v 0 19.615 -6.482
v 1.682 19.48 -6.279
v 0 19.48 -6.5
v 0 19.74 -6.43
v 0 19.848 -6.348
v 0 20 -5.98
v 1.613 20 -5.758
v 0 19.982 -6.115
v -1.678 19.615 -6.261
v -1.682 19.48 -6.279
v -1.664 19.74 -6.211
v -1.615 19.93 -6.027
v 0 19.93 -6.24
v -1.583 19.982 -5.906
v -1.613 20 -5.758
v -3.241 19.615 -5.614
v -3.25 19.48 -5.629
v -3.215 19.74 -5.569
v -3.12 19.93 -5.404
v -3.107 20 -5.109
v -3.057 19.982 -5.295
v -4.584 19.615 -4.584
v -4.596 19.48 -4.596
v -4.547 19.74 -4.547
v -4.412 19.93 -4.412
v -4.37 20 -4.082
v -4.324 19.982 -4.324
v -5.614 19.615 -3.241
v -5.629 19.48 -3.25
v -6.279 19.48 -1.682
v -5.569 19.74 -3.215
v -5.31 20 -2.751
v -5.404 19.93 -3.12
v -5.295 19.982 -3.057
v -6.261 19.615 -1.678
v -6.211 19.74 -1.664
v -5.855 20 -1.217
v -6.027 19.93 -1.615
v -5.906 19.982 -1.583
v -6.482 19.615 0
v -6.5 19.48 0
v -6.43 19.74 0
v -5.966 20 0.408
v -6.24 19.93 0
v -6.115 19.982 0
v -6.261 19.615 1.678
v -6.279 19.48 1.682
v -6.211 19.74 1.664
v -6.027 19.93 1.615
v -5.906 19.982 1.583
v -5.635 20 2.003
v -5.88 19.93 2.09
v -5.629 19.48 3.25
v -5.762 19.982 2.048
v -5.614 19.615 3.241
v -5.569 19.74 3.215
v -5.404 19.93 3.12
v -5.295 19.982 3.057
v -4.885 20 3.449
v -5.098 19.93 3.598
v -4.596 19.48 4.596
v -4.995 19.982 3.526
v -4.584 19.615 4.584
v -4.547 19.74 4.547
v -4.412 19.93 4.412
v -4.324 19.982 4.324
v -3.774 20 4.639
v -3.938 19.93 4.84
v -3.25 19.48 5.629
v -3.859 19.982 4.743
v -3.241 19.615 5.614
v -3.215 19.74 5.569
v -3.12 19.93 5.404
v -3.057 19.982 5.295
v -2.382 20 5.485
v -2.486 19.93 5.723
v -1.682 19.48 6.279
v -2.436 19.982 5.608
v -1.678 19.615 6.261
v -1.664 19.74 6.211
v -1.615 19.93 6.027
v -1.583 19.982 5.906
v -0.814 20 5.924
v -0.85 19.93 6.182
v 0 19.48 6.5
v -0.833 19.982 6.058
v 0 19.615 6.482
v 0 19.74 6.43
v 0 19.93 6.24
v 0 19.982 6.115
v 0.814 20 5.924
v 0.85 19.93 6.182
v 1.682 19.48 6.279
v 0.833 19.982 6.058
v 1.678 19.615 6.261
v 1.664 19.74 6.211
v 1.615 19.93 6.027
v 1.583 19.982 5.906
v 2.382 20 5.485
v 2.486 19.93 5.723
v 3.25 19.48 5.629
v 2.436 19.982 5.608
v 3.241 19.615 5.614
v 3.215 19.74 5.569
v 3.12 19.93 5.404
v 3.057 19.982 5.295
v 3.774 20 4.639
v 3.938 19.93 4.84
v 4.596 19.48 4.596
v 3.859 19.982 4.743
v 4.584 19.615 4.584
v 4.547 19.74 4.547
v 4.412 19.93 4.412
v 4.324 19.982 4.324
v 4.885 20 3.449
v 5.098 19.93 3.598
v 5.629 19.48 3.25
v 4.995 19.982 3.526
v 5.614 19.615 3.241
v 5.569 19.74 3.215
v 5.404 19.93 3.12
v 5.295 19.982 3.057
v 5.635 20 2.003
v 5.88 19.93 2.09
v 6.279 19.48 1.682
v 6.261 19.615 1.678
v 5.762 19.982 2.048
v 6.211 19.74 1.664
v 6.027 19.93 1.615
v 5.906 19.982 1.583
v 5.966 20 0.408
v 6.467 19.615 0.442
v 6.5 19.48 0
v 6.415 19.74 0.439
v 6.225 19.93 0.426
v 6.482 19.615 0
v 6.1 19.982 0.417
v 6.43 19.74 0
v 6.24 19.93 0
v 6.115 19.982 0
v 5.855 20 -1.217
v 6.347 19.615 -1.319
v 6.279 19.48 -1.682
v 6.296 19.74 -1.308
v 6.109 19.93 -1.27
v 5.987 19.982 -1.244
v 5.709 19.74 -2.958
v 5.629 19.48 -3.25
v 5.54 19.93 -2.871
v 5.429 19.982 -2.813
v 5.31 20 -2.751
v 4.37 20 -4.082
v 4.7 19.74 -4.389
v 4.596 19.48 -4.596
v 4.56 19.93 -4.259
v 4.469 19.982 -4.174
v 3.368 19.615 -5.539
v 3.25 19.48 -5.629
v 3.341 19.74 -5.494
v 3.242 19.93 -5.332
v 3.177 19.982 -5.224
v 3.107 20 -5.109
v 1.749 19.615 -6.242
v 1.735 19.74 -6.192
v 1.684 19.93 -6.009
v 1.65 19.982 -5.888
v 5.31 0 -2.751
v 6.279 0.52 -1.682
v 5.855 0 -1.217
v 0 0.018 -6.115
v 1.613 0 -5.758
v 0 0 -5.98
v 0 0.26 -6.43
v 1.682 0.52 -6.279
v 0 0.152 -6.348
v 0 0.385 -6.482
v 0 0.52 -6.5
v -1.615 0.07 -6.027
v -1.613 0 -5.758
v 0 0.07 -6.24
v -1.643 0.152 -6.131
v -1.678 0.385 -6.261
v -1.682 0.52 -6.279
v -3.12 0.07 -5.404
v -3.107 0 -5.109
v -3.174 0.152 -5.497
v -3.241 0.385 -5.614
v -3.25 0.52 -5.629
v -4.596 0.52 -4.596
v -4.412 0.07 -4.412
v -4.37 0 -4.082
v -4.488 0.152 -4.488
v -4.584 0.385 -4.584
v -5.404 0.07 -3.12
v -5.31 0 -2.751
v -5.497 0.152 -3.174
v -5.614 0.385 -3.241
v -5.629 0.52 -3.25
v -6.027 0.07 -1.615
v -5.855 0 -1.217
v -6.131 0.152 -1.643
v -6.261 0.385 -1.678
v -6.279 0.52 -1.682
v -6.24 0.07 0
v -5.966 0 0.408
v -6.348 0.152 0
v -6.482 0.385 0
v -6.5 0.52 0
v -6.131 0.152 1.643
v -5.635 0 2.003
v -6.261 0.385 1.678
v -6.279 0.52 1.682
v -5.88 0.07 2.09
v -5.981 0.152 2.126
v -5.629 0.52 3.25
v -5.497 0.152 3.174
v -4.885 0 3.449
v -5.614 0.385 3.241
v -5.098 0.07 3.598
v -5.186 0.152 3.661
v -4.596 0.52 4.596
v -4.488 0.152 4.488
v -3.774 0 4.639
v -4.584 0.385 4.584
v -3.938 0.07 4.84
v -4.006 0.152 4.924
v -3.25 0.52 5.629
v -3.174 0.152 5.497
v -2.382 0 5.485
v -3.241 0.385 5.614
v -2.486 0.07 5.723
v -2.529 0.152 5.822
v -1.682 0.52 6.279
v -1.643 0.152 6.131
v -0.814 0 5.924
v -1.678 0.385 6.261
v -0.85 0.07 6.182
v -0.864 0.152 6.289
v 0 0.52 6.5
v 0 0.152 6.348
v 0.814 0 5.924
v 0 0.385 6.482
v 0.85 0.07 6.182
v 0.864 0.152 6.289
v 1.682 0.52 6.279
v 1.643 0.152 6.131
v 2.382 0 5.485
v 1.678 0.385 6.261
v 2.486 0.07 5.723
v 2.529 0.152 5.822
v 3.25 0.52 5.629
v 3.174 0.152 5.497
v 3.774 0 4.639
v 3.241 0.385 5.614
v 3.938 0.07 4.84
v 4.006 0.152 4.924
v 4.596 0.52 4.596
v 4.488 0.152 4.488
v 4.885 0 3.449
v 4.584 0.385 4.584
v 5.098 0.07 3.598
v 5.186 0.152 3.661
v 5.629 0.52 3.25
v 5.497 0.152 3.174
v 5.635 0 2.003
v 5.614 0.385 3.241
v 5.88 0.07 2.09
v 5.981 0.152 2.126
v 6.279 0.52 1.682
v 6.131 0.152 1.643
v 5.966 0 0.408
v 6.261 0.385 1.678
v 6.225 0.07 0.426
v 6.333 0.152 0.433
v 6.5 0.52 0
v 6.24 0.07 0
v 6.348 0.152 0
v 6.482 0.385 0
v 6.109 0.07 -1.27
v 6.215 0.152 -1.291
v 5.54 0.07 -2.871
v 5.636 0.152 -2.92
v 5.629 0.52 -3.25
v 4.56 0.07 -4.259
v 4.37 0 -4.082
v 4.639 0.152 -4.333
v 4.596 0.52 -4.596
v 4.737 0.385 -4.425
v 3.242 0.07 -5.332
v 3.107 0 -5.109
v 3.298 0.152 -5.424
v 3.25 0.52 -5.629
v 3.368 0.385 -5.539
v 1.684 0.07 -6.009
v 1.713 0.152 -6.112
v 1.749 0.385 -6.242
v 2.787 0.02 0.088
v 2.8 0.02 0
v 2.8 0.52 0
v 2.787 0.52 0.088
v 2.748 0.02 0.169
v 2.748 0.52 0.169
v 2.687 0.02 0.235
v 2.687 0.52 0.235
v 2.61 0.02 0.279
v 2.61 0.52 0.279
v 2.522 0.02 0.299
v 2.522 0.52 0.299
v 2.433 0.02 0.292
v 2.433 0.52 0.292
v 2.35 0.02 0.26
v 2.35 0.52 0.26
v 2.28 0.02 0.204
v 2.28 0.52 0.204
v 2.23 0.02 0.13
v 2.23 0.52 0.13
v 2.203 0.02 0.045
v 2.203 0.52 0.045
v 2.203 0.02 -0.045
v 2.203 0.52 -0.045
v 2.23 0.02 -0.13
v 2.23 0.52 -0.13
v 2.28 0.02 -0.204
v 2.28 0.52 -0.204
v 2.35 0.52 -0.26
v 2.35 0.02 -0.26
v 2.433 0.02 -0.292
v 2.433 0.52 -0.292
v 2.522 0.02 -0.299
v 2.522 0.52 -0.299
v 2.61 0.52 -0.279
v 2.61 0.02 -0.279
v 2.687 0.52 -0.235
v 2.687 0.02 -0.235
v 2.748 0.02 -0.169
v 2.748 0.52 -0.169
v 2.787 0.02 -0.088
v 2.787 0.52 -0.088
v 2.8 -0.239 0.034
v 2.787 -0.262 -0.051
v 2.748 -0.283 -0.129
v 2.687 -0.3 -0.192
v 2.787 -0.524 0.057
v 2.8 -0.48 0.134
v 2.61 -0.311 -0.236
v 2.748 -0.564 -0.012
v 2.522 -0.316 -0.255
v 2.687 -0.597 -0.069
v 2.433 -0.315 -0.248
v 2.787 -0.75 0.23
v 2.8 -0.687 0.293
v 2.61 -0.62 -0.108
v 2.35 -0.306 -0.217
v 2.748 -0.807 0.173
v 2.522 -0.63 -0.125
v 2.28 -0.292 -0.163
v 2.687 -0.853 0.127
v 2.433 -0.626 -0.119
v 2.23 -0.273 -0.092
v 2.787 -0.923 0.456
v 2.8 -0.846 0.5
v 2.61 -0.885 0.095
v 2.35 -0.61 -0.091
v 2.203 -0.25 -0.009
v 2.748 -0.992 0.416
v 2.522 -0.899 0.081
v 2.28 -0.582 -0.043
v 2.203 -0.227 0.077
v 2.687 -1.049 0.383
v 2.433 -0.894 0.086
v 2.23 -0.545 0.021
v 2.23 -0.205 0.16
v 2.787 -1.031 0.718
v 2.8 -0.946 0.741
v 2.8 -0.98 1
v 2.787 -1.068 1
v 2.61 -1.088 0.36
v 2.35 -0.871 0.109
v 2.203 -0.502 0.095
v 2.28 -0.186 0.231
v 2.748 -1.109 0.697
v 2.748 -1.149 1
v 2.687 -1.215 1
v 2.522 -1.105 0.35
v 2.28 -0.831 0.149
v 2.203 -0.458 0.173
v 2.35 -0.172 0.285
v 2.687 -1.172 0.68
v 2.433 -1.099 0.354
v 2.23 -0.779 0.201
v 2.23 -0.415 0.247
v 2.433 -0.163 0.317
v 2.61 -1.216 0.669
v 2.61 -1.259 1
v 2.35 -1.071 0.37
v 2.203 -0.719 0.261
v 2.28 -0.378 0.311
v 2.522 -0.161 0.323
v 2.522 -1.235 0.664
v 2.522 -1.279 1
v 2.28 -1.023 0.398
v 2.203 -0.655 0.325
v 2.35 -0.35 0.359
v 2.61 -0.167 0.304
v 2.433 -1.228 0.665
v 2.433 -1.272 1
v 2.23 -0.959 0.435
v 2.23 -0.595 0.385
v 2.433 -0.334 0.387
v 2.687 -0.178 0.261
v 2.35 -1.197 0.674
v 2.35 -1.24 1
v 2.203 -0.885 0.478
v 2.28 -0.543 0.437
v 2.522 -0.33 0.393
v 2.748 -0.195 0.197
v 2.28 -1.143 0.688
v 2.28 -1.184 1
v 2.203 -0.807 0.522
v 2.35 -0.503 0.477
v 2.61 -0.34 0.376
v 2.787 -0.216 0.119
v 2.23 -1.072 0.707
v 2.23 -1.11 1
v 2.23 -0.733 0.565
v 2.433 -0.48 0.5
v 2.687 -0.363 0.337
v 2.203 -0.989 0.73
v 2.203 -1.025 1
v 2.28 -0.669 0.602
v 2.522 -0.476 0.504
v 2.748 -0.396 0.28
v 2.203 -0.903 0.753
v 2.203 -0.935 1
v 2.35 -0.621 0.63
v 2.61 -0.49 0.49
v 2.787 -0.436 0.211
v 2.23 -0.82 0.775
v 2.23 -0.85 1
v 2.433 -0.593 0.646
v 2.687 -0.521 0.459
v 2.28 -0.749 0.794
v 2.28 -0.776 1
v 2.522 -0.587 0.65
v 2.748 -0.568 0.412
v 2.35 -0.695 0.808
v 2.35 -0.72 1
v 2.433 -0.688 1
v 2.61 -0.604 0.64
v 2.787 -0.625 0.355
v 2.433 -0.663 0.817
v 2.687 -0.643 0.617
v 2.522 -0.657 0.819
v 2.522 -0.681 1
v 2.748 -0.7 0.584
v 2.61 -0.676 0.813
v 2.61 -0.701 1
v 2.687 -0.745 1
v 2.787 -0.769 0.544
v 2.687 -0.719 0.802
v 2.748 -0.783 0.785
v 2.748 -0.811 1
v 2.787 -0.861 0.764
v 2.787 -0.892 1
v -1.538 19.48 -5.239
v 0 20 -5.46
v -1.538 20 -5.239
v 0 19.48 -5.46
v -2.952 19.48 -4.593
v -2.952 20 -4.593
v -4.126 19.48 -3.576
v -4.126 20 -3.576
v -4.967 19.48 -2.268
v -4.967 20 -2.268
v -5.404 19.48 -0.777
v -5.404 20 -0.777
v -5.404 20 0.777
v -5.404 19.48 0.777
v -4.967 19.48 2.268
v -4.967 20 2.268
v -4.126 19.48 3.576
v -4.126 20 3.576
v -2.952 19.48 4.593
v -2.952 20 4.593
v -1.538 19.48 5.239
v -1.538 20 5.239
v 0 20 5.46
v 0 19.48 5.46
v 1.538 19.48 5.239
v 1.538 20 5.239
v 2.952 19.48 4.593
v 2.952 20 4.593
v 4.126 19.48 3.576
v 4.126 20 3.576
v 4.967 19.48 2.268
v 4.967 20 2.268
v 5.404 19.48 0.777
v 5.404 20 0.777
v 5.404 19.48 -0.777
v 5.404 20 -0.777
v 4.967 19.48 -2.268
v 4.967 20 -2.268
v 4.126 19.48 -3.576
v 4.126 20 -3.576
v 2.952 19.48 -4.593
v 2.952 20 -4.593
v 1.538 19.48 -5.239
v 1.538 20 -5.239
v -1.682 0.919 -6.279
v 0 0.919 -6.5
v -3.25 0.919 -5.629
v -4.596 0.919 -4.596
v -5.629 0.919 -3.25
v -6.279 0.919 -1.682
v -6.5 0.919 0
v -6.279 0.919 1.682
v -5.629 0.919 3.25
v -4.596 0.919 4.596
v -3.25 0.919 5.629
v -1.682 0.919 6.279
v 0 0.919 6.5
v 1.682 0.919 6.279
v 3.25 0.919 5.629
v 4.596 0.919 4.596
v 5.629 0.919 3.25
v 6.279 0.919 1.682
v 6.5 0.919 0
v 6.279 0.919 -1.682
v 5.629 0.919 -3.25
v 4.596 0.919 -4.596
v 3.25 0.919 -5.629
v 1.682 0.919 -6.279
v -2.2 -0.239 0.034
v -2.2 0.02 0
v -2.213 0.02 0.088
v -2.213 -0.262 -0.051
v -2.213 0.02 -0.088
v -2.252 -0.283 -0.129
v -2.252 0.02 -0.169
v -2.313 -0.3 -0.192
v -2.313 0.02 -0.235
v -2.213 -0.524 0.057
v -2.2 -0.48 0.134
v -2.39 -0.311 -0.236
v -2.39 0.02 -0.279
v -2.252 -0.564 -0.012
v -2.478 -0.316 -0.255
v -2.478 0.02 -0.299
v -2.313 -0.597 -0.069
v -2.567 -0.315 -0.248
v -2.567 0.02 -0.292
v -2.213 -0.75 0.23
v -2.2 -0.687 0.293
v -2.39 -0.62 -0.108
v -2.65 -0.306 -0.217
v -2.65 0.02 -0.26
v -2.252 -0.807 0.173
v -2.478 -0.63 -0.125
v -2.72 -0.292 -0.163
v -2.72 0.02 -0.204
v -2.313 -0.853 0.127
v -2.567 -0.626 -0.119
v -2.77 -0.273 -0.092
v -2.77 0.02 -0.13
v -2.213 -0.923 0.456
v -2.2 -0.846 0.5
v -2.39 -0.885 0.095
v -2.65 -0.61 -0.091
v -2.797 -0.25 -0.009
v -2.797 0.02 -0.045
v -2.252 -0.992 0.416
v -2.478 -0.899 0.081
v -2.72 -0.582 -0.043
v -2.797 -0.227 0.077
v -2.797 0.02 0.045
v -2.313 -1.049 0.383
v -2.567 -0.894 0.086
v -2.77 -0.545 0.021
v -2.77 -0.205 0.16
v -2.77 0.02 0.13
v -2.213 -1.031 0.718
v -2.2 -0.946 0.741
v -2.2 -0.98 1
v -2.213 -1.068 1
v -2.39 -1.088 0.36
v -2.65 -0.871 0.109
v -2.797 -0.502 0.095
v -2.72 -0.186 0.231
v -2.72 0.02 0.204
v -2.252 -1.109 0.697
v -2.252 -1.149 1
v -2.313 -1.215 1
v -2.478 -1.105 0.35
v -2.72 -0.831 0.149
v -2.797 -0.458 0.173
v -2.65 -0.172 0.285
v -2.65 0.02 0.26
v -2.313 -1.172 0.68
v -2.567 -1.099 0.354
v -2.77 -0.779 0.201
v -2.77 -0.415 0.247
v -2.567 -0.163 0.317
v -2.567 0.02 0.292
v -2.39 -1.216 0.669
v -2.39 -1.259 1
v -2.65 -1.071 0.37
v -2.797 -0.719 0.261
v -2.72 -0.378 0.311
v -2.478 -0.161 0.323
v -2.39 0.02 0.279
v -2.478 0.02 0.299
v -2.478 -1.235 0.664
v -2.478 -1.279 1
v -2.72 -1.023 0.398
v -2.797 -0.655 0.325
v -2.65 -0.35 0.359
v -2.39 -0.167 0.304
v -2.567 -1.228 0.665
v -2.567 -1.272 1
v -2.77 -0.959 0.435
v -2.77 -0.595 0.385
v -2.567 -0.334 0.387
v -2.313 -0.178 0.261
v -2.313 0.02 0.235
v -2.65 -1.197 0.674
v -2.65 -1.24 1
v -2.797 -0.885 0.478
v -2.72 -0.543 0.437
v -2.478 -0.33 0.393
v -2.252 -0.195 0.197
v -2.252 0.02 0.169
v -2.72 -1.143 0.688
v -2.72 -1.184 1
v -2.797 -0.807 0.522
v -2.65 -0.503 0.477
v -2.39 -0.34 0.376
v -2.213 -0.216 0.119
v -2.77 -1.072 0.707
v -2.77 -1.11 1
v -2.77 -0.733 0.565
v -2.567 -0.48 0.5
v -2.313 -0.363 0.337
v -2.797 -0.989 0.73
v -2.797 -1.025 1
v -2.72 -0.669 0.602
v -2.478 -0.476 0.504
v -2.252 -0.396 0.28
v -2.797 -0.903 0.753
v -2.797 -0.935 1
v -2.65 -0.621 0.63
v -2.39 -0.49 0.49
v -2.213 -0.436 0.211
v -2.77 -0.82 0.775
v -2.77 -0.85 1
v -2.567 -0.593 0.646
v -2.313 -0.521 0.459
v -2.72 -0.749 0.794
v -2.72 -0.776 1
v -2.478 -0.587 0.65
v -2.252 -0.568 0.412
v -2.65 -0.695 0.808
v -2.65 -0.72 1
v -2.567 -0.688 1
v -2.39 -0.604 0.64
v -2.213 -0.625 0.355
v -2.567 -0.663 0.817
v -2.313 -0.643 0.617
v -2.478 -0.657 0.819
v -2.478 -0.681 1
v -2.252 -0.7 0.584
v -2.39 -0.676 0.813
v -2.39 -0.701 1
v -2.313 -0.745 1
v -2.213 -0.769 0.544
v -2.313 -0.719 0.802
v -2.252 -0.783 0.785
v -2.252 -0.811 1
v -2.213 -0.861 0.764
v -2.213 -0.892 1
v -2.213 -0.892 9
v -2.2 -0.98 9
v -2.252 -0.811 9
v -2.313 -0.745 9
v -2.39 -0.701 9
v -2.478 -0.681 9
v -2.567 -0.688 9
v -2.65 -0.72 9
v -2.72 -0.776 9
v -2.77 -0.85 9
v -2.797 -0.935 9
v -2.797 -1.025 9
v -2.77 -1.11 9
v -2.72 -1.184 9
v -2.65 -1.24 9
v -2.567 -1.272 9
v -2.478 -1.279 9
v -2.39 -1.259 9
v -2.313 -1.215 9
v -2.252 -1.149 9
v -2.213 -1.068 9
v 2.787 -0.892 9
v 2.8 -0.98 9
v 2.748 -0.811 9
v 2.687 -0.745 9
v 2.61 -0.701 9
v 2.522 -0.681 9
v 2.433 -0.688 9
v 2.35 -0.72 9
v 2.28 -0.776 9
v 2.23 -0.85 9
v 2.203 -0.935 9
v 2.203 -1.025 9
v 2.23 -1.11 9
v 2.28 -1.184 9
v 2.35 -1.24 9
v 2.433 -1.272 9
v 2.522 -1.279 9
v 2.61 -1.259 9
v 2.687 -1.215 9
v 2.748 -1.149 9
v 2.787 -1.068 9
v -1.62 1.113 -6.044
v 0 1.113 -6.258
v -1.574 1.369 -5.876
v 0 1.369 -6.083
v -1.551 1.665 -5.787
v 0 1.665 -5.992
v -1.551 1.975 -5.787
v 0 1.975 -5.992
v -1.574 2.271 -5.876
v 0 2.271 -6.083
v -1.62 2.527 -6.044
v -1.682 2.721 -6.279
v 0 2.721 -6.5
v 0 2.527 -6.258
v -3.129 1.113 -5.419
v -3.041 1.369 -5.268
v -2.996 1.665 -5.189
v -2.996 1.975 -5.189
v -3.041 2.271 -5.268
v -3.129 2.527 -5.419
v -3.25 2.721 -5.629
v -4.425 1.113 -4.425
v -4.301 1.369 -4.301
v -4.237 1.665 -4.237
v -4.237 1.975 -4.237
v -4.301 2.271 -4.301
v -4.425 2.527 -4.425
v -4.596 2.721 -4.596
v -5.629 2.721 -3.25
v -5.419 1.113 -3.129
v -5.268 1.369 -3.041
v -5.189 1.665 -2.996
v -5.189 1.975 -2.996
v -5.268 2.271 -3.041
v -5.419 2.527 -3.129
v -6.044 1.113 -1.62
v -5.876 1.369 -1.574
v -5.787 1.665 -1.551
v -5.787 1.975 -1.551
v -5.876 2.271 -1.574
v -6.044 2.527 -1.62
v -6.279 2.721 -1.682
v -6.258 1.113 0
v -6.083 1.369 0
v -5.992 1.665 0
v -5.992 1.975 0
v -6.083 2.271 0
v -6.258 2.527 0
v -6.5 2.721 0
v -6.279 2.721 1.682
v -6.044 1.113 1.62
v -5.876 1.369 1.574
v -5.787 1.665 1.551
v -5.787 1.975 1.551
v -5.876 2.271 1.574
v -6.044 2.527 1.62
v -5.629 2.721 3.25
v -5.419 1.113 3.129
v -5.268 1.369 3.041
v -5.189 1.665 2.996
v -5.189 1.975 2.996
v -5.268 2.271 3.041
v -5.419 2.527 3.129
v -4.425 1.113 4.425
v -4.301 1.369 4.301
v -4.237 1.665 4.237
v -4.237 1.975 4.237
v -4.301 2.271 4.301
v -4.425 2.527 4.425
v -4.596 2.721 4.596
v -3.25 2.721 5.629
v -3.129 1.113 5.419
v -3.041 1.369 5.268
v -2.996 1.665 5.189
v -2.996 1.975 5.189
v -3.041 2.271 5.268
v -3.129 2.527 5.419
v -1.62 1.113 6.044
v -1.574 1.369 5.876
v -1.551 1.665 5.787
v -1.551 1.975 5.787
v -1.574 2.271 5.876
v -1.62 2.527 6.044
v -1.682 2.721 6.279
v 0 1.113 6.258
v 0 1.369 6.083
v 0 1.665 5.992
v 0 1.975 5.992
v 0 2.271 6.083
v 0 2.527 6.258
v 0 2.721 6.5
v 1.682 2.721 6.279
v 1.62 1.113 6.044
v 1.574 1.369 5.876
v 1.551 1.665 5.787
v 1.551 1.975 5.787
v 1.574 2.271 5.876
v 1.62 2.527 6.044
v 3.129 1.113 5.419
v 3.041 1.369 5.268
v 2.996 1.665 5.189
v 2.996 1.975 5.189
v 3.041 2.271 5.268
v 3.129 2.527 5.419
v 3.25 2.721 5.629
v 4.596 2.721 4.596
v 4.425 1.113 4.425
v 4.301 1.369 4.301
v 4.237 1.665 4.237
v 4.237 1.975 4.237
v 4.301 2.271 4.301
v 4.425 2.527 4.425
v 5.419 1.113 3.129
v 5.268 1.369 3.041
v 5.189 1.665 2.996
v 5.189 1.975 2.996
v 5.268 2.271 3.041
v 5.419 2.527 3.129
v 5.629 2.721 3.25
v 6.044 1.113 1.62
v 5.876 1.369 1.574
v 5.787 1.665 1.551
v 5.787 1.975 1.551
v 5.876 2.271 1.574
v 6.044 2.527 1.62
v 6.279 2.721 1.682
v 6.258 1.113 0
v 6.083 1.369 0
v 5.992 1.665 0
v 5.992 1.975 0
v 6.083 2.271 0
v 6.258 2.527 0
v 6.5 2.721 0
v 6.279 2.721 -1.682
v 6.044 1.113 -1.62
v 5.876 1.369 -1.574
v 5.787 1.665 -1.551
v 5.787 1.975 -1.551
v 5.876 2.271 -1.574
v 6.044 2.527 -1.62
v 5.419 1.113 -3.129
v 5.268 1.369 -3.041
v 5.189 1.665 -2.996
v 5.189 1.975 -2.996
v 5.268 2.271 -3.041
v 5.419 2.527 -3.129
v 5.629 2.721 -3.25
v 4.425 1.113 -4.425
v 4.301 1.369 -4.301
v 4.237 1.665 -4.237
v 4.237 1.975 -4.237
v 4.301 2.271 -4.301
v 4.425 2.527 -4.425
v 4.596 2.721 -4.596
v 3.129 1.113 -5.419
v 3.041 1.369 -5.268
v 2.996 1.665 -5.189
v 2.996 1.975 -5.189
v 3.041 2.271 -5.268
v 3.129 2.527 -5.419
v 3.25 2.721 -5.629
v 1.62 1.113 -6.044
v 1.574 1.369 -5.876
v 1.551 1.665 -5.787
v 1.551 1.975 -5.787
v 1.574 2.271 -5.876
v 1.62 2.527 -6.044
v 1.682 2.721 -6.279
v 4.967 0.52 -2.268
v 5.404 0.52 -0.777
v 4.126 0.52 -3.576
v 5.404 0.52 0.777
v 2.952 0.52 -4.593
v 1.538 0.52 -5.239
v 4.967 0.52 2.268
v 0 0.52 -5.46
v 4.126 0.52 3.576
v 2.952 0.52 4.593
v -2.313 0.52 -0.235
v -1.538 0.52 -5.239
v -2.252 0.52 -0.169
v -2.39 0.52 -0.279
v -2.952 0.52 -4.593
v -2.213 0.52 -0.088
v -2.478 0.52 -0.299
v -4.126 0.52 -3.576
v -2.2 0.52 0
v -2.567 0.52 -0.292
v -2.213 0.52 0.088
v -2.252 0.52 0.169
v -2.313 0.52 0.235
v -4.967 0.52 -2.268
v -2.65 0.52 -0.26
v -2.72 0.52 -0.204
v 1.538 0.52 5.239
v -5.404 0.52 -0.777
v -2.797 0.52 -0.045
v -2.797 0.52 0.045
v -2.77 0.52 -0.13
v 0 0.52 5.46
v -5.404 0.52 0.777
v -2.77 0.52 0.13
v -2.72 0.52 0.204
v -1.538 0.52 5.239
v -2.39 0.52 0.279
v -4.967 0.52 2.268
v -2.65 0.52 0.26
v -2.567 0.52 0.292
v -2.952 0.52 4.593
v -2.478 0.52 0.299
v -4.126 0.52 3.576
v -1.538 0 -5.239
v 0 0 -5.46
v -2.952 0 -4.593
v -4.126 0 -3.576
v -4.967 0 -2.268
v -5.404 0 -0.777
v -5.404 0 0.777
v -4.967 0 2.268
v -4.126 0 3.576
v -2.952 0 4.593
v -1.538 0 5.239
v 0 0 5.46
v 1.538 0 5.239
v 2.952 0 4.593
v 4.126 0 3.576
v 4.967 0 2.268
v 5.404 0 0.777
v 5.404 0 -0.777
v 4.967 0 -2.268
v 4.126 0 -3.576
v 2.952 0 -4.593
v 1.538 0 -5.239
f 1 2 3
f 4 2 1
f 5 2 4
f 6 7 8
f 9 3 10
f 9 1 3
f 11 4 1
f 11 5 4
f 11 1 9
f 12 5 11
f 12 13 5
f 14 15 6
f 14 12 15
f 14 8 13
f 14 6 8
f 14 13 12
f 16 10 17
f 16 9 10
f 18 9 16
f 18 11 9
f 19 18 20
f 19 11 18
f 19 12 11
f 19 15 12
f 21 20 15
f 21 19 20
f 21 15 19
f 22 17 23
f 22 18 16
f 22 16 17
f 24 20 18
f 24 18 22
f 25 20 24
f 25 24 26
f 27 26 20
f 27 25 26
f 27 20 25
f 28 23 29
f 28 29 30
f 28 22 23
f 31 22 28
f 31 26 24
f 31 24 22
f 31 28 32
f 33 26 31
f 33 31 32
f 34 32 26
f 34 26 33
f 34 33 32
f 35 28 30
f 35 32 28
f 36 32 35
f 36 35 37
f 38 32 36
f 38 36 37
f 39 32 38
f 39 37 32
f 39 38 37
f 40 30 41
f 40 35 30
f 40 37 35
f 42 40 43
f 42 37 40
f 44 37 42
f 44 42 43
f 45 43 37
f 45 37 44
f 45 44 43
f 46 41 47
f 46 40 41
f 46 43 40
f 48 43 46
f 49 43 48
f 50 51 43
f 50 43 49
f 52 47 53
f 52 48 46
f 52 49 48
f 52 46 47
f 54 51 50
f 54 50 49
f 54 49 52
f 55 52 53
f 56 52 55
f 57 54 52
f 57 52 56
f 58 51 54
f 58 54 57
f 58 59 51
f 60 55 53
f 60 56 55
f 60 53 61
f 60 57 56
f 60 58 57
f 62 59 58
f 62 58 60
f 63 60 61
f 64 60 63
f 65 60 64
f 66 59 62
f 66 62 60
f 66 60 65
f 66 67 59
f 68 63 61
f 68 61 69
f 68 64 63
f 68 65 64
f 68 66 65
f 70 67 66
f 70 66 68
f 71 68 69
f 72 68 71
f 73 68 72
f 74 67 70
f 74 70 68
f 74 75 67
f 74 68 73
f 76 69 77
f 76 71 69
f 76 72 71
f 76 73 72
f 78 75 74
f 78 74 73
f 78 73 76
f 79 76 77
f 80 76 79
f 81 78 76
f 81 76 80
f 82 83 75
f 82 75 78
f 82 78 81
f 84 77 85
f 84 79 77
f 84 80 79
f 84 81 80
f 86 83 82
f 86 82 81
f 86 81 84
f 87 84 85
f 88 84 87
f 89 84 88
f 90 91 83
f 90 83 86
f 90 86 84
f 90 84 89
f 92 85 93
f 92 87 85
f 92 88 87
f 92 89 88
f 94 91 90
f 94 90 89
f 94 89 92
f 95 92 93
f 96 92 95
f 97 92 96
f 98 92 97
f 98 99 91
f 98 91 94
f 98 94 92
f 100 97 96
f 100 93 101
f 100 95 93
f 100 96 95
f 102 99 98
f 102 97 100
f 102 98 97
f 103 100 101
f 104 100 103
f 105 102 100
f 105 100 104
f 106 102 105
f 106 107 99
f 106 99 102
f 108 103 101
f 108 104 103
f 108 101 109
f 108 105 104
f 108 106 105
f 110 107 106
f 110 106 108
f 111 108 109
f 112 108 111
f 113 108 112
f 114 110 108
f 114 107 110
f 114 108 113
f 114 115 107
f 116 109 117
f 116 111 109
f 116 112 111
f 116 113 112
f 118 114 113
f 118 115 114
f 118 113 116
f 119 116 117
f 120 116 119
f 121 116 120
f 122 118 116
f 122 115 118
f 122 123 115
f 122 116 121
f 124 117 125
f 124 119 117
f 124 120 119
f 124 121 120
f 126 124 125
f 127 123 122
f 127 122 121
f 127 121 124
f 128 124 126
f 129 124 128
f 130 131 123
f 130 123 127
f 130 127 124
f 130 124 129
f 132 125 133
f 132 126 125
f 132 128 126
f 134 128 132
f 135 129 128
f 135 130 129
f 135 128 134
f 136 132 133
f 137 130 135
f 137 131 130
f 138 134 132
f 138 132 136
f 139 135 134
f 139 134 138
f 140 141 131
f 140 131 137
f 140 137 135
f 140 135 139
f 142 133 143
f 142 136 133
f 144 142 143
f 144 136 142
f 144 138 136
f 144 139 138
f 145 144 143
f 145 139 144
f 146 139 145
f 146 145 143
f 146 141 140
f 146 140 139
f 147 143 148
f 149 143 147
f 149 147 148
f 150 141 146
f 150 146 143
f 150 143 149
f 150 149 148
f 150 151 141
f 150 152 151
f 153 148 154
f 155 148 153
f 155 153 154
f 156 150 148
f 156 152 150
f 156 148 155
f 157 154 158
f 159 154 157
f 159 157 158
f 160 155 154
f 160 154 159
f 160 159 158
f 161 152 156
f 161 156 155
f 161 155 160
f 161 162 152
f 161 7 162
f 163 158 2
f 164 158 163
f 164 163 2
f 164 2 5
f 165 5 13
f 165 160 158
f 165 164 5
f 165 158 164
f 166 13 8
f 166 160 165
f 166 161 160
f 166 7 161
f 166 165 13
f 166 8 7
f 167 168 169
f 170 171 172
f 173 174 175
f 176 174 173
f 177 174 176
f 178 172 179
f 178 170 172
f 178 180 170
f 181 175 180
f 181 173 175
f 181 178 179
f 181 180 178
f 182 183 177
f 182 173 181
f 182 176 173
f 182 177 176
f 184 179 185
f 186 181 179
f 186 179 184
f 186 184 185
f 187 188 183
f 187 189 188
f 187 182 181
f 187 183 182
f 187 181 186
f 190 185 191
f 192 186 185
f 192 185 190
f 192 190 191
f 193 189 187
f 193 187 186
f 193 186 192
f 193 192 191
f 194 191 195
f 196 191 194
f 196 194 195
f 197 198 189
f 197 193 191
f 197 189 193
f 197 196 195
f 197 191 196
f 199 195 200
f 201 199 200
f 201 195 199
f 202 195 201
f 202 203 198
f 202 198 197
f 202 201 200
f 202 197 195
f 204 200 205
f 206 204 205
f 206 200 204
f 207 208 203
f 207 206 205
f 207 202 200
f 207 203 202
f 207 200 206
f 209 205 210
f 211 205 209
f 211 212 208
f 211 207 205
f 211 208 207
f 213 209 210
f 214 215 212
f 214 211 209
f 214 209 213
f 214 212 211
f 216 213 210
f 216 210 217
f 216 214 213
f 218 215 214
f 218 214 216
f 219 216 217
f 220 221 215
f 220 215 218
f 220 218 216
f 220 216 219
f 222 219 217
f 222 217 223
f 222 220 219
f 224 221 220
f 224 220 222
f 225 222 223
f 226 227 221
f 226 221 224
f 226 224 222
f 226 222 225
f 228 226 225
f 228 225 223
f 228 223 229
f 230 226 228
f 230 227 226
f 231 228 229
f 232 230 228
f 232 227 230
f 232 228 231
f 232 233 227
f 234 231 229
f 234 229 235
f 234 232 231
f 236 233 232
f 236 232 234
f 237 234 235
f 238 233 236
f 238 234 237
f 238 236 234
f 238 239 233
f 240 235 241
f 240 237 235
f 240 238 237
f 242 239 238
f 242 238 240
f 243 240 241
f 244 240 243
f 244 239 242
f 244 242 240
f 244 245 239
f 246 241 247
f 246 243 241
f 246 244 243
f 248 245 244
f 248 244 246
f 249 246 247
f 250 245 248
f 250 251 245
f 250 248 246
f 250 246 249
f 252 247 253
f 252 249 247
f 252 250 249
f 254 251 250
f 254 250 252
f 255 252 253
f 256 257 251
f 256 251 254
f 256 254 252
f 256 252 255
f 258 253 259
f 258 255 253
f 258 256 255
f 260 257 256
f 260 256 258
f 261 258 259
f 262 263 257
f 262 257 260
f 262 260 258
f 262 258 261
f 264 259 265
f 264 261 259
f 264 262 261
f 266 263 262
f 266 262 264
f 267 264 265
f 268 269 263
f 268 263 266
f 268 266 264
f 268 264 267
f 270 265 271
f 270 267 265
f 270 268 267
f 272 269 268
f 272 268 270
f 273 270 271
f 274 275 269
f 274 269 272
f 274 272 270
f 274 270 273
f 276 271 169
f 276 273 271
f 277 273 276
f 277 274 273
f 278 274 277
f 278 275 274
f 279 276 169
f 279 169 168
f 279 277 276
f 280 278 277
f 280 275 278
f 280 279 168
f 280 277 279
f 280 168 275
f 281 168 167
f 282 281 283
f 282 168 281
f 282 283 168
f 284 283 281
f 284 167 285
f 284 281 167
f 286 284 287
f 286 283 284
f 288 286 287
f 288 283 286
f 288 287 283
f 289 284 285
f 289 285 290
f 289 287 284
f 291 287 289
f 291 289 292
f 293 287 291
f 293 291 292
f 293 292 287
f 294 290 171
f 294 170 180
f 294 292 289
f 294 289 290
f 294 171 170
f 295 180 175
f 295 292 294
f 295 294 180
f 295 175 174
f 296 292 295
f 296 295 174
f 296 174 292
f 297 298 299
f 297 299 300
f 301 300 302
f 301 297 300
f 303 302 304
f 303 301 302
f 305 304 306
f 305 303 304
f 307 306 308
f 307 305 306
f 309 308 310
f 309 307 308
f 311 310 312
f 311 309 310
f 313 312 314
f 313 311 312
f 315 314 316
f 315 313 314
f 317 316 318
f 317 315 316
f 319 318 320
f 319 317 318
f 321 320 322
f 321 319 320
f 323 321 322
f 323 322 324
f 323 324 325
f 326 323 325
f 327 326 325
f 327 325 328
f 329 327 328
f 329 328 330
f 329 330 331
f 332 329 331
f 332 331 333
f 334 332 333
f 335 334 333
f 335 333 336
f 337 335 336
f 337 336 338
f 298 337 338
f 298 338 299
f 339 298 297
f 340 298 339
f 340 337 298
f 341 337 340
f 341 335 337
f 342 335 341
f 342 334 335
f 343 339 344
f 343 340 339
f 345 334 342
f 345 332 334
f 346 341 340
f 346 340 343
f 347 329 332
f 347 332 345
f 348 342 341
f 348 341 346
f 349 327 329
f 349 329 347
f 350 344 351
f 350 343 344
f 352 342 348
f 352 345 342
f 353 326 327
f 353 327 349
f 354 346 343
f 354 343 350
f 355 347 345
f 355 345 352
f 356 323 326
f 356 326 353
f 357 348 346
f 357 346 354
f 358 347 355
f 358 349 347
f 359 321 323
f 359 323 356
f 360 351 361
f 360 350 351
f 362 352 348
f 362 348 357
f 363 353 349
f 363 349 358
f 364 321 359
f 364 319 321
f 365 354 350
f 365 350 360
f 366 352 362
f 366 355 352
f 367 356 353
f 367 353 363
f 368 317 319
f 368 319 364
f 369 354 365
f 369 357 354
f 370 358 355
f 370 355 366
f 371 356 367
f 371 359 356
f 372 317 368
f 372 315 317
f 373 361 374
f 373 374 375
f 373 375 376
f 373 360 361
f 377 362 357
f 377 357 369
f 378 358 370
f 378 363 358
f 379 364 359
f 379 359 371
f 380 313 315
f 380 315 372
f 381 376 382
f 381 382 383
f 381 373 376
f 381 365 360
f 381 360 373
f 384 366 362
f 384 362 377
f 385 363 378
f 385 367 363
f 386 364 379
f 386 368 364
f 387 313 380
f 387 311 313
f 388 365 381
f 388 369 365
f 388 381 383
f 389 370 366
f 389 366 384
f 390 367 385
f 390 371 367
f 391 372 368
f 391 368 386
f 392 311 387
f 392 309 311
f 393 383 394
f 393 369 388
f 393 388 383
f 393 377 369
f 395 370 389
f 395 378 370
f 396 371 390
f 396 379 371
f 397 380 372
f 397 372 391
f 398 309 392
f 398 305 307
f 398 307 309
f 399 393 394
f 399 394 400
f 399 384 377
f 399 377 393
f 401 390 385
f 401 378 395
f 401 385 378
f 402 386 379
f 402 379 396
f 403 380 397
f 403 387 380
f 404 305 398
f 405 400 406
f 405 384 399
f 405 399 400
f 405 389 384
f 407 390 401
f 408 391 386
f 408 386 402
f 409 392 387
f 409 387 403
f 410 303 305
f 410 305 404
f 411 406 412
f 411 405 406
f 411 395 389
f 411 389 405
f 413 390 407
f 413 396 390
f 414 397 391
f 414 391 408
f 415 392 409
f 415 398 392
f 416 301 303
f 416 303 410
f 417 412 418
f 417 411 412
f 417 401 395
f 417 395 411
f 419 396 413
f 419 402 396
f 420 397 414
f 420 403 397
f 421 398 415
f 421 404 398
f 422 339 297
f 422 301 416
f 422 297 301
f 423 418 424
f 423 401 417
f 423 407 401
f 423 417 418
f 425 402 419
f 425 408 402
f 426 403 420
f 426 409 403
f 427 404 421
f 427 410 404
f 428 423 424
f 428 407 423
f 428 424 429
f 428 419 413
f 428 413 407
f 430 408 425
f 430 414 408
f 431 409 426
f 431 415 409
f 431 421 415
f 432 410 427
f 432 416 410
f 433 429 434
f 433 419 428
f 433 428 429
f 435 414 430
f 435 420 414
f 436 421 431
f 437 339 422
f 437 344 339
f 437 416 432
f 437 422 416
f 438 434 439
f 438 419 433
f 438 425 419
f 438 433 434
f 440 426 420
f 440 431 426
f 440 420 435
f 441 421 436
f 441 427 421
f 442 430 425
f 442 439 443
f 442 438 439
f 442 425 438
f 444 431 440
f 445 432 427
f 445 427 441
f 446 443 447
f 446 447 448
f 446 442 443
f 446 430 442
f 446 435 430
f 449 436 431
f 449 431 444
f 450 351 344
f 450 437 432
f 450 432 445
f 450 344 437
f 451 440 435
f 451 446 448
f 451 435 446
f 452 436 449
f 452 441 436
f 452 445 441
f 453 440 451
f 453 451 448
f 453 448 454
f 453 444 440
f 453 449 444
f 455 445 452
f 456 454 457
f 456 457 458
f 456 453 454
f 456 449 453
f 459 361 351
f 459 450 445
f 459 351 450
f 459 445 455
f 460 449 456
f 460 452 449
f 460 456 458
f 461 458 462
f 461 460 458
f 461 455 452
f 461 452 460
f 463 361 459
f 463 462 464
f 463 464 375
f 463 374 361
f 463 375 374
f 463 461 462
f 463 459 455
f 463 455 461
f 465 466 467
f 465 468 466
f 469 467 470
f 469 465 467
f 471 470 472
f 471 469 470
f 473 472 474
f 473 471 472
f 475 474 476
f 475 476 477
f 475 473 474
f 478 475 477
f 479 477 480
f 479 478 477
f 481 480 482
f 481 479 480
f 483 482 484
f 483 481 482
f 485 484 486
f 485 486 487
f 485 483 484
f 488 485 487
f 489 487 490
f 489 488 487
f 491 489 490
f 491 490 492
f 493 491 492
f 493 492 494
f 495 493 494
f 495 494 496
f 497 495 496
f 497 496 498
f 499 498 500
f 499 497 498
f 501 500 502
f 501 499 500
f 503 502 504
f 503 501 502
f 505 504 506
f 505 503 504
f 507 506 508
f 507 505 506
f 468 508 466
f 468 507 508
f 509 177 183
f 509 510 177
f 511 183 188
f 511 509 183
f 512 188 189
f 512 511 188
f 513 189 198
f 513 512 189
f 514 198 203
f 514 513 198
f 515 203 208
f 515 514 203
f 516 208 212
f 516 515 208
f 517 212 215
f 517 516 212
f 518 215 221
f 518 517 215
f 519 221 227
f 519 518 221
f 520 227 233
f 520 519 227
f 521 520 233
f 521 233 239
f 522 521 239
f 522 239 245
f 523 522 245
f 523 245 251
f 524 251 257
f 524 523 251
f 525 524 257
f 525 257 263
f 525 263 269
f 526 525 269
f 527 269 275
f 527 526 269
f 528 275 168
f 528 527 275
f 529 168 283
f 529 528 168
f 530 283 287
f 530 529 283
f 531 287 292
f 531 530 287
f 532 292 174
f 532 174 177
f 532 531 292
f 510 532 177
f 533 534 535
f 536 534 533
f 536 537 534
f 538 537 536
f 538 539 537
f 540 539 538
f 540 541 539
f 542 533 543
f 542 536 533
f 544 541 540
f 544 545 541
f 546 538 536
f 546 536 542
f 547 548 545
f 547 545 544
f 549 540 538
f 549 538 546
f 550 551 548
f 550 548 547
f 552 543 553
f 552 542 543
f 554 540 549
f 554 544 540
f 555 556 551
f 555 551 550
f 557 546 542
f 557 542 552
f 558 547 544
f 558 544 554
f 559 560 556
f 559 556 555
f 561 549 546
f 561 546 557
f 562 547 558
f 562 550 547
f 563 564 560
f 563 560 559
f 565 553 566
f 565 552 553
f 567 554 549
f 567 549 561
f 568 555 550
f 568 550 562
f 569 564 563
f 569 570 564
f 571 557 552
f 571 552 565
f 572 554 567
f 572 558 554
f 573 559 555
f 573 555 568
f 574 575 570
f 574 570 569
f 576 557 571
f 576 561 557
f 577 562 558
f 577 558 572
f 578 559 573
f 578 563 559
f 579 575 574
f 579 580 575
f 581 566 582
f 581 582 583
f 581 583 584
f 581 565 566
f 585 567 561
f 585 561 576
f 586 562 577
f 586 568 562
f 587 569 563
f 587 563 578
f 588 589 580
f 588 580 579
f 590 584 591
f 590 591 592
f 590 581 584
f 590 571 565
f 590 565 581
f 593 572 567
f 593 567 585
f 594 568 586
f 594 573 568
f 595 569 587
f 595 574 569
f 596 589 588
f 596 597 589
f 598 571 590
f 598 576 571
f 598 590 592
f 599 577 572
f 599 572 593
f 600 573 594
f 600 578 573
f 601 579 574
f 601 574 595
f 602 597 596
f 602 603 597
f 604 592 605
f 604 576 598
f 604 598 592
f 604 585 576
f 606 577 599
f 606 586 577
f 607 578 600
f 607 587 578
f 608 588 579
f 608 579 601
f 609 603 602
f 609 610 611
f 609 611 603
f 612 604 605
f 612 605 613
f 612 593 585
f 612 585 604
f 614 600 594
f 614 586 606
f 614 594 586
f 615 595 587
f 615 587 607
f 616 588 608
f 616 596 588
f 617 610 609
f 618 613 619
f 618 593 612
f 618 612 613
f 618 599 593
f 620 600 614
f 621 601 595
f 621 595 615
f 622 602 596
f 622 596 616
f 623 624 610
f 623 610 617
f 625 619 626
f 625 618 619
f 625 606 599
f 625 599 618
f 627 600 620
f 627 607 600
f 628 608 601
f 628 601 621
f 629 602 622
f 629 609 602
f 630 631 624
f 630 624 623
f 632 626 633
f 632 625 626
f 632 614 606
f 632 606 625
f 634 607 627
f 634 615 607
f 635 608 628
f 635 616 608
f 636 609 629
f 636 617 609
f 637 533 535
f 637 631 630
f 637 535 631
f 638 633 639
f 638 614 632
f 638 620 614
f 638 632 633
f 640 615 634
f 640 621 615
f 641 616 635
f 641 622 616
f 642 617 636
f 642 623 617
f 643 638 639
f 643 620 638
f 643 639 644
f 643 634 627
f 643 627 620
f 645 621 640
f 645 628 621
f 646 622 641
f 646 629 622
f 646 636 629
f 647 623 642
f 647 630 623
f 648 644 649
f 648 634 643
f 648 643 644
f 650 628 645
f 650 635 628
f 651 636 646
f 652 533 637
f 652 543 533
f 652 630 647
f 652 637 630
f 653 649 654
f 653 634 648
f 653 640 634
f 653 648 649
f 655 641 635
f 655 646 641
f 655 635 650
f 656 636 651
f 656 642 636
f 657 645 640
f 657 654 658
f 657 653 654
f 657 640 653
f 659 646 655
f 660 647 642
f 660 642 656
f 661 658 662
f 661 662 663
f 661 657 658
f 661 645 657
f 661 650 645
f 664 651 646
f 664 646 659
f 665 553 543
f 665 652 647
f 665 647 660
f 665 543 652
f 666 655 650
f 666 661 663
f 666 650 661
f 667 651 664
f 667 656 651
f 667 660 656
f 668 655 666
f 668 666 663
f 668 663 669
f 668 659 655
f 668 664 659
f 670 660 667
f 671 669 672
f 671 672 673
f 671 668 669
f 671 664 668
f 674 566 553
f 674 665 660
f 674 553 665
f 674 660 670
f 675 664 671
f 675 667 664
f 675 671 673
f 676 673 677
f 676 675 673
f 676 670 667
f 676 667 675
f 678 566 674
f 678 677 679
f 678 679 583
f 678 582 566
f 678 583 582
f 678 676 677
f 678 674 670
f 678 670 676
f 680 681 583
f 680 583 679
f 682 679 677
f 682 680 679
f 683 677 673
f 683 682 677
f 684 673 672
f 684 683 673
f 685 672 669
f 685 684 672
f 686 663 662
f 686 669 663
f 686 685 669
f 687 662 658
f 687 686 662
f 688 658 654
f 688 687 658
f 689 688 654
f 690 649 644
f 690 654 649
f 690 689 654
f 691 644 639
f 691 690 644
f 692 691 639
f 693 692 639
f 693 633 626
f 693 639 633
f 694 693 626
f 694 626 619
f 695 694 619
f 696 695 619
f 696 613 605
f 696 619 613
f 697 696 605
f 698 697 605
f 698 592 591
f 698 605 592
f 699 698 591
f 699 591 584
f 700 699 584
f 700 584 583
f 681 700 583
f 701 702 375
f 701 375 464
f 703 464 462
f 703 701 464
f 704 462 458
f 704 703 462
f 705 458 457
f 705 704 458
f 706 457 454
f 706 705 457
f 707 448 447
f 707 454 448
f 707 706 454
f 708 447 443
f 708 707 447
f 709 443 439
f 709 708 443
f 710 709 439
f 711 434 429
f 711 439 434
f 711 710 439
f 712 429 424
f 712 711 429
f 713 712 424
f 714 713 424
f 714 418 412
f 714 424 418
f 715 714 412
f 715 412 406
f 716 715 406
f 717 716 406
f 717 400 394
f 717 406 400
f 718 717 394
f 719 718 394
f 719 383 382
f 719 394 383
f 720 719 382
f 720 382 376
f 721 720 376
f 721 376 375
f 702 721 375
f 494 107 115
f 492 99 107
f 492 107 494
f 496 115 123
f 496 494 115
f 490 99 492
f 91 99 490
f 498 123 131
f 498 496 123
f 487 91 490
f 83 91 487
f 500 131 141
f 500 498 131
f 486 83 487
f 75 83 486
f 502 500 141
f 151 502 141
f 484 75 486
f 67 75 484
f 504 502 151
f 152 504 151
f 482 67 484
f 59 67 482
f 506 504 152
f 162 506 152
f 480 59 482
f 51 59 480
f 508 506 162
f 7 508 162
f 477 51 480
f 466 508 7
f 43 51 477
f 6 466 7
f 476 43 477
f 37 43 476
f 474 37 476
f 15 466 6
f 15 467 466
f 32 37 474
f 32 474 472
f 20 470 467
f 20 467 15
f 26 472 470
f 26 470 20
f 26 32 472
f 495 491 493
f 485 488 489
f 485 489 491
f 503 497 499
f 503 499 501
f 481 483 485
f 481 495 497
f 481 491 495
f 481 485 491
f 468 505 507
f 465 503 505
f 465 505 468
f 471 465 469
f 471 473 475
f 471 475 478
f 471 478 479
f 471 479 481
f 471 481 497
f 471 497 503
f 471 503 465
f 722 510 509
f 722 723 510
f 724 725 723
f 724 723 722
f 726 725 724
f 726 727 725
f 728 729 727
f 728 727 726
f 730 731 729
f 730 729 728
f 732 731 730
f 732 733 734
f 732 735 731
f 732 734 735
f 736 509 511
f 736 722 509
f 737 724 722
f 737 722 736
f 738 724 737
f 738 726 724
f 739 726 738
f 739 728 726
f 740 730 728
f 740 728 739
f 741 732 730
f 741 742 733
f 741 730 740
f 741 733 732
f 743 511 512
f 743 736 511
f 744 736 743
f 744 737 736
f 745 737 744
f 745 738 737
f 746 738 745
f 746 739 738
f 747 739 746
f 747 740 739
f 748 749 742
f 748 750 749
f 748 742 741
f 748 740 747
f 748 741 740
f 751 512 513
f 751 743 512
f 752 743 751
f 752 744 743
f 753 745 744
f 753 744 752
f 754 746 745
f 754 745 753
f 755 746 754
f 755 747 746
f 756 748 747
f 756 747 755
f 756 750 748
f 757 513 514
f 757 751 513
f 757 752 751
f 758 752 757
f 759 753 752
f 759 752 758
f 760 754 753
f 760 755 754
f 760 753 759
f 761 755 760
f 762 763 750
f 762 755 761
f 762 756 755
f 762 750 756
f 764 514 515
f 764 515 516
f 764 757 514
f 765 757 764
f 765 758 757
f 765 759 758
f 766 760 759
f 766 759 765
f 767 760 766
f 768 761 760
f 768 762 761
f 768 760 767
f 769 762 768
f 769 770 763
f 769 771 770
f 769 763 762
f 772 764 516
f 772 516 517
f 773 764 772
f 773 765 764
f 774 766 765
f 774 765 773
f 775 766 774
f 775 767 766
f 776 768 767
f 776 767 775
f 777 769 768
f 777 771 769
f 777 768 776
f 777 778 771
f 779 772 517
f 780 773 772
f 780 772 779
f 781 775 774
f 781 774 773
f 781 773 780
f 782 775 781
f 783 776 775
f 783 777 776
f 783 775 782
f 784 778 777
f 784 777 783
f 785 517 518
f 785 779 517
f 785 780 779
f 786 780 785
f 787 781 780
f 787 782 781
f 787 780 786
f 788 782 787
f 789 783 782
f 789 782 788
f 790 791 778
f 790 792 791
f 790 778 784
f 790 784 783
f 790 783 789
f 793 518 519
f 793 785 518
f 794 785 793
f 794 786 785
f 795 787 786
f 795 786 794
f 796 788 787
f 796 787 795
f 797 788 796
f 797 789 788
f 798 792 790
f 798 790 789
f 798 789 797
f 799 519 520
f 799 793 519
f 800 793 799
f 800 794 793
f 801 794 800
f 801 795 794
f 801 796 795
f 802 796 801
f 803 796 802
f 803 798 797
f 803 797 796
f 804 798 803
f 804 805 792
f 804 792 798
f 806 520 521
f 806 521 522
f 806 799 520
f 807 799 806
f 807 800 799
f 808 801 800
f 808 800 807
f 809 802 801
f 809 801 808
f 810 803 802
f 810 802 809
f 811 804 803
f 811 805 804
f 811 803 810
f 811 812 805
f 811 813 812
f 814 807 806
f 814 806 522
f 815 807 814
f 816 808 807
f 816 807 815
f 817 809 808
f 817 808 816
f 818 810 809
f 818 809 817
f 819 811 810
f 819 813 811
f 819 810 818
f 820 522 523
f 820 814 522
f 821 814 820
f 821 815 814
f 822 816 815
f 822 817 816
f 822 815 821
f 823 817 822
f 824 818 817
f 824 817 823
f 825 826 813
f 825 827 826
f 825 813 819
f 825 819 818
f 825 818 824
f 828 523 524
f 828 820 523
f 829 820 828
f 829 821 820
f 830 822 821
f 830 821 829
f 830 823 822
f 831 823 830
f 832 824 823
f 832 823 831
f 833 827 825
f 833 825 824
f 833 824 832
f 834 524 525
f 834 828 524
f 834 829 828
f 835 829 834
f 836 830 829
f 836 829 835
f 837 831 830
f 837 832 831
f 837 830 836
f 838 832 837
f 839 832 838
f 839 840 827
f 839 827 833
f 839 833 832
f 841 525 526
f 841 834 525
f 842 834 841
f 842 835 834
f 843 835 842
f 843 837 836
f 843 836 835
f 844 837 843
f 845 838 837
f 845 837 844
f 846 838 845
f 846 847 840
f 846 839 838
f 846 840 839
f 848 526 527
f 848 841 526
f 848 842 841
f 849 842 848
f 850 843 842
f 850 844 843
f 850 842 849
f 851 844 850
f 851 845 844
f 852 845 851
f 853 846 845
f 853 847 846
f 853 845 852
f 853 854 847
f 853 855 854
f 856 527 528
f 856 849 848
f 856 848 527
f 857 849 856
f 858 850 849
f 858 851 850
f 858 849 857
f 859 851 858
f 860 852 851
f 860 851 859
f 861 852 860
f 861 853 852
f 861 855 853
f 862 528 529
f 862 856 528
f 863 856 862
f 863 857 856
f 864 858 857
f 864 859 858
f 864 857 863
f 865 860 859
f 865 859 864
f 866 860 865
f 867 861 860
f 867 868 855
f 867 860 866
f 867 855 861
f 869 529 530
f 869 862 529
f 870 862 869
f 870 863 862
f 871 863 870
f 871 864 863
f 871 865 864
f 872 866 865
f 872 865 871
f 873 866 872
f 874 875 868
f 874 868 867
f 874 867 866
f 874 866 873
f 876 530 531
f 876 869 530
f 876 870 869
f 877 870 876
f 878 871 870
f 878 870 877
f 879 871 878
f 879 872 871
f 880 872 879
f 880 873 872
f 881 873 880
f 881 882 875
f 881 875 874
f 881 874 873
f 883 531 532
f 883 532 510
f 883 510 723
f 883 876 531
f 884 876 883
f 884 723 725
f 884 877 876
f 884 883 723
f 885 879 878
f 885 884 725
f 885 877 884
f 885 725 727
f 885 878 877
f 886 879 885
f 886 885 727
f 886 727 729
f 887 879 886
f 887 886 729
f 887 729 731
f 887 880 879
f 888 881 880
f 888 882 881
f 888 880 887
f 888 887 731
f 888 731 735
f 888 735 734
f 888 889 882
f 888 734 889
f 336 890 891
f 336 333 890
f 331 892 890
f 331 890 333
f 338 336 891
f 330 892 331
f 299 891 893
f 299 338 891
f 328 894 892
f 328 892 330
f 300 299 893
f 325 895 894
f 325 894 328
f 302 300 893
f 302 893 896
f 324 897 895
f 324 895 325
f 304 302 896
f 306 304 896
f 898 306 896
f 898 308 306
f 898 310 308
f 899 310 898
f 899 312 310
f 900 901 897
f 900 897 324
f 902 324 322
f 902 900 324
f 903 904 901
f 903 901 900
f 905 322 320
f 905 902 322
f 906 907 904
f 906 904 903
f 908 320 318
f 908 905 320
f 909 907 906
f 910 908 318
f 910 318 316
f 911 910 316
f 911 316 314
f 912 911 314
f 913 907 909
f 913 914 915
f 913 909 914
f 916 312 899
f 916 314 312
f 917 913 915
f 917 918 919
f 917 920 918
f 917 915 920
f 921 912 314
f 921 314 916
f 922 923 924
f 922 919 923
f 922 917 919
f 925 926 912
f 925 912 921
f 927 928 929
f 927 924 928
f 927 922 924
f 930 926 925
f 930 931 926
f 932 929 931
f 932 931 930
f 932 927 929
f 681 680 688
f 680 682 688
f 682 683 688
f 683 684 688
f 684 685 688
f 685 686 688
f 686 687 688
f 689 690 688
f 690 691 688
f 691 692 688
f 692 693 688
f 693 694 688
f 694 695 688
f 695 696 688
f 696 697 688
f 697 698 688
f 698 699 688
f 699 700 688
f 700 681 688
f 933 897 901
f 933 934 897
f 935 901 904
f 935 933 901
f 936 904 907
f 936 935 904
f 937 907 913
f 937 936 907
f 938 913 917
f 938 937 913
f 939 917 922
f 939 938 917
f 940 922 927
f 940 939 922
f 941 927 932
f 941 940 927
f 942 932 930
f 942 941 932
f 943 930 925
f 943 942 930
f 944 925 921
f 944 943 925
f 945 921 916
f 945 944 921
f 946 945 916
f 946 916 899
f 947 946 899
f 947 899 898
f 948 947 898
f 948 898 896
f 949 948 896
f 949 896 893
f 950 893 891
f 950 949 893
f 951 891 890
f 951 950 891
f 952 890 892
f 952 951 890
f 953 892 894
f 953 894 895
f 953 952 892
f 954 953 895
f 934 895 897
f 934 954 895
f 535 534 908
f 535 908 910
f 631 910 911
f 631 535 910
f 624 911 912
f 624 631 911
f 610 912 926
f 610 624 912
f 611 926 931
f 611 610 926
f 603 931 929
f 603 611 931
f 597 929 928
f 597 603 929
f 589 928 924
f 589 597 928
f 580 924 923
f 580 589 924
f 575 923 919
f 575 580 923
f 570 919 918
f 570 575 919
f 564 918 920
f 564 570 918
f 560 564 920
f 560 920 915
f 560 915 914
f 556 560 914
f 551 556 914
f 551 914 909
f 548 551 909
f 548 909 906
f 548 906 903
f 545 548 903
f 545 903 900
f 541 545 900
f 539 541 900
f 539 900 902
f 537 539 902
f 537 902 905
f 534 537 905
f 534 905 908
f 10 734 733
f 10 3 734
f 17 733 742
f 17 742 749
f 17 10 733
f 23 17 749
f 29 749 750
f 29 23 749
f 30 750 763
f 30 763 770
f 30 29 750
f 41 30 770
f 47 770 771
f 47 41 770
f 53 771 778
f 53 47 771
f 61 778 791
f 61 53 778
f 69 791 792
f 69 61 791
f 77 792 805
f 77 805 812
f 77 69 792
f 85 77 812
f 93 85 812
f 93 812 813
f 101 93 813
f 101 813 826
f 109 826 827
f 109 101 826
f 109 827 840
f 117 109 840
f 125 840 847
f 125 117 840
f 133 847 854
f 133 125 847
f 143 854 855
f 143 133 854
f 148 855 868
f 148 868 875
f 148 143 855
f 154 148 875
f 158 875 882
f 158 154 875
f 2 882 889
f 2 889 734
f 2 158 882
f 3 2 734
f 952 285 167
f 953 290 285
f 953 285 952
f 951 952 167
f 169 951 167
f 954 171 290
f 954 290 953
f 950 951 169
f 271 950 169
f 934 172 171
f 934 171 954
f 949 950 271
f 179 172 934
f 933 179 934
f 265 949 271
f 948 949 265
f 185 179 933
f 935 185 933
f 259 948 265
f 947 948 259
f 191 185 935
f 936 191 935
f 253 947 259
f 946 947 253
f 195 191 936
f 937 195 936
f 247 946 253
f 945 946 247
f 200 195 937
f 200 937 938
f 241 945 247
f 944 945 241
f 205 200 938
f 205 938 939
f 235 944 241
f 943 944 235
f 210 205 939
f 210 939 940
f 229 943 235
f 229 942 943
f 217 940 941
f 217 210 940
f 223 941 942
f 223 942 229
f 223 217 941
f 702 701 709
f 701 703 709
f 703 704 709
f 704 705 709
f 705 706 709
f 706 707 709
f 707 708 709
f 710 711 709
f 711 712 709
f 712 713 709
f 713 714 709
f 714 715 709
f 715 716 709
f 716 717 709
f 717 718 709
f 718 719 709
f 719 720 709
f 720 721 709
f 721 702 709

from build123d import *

# Parameters (mm, degrees)
SKETCH16_R = 0.3


with BuildPart() as part:
    # Sketch1 → Body (revolve)
    with BuildSketch(Plane.XY, mode=Mode.PRIVATE) as body_sk:
        with BuildLine():
            Line((6.5, 2.72066642), (6.5, 19.48))
            ThreePointArc((6.5, 19.48), (6.347695526, 19.847695526), (5.98, 20))
            Line((5.98, 20), (5.46, 20))
            Line((5.46, 20), (5.46, 19.48))
            Line((5.46, 19.48), (0, 19.48))
            Line((0, 19.48), (0, 0.52))
            Line((0, 0.52), (5.46, 0.52))
            Line((5.46, 0.52), (5.46, 0))
            Line((5.46, 0), (5.98, 0))
            ThreePointArc((5.98, 0), (6.347695526, 0.152304474), (6.5, 0.52))
            Line((6.5, 0.52), (6.5, 0.91933358))
            ThreePointArc((6.5, 0.91933358), (5.98, 1.82), (6.5, 2.72066642))
        make_face()
    revolve(body_sk.sketch.rotate(Axis((0, 0.52, 0), (0, 1, 0)), 90), axis=Axis((0, 0.52, 0), (0, 1, 0)))

    # По траектории1: sweep along a path in Эскиз1
    with BuildLine(Plane(origin=(0, 0, 0), x_dir=(0, 0, -1), z_dir=(1, 0, 0))) as sweep_1_path:
        Line((0, 0.52), (0, 0.02))
        ThreePointArc((0, 0.02), (-0.292893219, -0.687106781), (-1, -0.98))
        Line((-1, -0.98), (-9, -0.98))
    # Sketch16 → По траектории1 (sweep)
    with BuildSketch(Plane(origin=(0, 0.52, 0), x_dir=(1, 0, 0), z_dir=(0, 1, 0))):
        with Locations((-2.5, 0)):
            Circle(SKETCH16_R)
        with Locations((2.5, 0)):
            Circle(SKETCH16_R)
    sweep(path=sweep_1_path.line)


solid = part.part
